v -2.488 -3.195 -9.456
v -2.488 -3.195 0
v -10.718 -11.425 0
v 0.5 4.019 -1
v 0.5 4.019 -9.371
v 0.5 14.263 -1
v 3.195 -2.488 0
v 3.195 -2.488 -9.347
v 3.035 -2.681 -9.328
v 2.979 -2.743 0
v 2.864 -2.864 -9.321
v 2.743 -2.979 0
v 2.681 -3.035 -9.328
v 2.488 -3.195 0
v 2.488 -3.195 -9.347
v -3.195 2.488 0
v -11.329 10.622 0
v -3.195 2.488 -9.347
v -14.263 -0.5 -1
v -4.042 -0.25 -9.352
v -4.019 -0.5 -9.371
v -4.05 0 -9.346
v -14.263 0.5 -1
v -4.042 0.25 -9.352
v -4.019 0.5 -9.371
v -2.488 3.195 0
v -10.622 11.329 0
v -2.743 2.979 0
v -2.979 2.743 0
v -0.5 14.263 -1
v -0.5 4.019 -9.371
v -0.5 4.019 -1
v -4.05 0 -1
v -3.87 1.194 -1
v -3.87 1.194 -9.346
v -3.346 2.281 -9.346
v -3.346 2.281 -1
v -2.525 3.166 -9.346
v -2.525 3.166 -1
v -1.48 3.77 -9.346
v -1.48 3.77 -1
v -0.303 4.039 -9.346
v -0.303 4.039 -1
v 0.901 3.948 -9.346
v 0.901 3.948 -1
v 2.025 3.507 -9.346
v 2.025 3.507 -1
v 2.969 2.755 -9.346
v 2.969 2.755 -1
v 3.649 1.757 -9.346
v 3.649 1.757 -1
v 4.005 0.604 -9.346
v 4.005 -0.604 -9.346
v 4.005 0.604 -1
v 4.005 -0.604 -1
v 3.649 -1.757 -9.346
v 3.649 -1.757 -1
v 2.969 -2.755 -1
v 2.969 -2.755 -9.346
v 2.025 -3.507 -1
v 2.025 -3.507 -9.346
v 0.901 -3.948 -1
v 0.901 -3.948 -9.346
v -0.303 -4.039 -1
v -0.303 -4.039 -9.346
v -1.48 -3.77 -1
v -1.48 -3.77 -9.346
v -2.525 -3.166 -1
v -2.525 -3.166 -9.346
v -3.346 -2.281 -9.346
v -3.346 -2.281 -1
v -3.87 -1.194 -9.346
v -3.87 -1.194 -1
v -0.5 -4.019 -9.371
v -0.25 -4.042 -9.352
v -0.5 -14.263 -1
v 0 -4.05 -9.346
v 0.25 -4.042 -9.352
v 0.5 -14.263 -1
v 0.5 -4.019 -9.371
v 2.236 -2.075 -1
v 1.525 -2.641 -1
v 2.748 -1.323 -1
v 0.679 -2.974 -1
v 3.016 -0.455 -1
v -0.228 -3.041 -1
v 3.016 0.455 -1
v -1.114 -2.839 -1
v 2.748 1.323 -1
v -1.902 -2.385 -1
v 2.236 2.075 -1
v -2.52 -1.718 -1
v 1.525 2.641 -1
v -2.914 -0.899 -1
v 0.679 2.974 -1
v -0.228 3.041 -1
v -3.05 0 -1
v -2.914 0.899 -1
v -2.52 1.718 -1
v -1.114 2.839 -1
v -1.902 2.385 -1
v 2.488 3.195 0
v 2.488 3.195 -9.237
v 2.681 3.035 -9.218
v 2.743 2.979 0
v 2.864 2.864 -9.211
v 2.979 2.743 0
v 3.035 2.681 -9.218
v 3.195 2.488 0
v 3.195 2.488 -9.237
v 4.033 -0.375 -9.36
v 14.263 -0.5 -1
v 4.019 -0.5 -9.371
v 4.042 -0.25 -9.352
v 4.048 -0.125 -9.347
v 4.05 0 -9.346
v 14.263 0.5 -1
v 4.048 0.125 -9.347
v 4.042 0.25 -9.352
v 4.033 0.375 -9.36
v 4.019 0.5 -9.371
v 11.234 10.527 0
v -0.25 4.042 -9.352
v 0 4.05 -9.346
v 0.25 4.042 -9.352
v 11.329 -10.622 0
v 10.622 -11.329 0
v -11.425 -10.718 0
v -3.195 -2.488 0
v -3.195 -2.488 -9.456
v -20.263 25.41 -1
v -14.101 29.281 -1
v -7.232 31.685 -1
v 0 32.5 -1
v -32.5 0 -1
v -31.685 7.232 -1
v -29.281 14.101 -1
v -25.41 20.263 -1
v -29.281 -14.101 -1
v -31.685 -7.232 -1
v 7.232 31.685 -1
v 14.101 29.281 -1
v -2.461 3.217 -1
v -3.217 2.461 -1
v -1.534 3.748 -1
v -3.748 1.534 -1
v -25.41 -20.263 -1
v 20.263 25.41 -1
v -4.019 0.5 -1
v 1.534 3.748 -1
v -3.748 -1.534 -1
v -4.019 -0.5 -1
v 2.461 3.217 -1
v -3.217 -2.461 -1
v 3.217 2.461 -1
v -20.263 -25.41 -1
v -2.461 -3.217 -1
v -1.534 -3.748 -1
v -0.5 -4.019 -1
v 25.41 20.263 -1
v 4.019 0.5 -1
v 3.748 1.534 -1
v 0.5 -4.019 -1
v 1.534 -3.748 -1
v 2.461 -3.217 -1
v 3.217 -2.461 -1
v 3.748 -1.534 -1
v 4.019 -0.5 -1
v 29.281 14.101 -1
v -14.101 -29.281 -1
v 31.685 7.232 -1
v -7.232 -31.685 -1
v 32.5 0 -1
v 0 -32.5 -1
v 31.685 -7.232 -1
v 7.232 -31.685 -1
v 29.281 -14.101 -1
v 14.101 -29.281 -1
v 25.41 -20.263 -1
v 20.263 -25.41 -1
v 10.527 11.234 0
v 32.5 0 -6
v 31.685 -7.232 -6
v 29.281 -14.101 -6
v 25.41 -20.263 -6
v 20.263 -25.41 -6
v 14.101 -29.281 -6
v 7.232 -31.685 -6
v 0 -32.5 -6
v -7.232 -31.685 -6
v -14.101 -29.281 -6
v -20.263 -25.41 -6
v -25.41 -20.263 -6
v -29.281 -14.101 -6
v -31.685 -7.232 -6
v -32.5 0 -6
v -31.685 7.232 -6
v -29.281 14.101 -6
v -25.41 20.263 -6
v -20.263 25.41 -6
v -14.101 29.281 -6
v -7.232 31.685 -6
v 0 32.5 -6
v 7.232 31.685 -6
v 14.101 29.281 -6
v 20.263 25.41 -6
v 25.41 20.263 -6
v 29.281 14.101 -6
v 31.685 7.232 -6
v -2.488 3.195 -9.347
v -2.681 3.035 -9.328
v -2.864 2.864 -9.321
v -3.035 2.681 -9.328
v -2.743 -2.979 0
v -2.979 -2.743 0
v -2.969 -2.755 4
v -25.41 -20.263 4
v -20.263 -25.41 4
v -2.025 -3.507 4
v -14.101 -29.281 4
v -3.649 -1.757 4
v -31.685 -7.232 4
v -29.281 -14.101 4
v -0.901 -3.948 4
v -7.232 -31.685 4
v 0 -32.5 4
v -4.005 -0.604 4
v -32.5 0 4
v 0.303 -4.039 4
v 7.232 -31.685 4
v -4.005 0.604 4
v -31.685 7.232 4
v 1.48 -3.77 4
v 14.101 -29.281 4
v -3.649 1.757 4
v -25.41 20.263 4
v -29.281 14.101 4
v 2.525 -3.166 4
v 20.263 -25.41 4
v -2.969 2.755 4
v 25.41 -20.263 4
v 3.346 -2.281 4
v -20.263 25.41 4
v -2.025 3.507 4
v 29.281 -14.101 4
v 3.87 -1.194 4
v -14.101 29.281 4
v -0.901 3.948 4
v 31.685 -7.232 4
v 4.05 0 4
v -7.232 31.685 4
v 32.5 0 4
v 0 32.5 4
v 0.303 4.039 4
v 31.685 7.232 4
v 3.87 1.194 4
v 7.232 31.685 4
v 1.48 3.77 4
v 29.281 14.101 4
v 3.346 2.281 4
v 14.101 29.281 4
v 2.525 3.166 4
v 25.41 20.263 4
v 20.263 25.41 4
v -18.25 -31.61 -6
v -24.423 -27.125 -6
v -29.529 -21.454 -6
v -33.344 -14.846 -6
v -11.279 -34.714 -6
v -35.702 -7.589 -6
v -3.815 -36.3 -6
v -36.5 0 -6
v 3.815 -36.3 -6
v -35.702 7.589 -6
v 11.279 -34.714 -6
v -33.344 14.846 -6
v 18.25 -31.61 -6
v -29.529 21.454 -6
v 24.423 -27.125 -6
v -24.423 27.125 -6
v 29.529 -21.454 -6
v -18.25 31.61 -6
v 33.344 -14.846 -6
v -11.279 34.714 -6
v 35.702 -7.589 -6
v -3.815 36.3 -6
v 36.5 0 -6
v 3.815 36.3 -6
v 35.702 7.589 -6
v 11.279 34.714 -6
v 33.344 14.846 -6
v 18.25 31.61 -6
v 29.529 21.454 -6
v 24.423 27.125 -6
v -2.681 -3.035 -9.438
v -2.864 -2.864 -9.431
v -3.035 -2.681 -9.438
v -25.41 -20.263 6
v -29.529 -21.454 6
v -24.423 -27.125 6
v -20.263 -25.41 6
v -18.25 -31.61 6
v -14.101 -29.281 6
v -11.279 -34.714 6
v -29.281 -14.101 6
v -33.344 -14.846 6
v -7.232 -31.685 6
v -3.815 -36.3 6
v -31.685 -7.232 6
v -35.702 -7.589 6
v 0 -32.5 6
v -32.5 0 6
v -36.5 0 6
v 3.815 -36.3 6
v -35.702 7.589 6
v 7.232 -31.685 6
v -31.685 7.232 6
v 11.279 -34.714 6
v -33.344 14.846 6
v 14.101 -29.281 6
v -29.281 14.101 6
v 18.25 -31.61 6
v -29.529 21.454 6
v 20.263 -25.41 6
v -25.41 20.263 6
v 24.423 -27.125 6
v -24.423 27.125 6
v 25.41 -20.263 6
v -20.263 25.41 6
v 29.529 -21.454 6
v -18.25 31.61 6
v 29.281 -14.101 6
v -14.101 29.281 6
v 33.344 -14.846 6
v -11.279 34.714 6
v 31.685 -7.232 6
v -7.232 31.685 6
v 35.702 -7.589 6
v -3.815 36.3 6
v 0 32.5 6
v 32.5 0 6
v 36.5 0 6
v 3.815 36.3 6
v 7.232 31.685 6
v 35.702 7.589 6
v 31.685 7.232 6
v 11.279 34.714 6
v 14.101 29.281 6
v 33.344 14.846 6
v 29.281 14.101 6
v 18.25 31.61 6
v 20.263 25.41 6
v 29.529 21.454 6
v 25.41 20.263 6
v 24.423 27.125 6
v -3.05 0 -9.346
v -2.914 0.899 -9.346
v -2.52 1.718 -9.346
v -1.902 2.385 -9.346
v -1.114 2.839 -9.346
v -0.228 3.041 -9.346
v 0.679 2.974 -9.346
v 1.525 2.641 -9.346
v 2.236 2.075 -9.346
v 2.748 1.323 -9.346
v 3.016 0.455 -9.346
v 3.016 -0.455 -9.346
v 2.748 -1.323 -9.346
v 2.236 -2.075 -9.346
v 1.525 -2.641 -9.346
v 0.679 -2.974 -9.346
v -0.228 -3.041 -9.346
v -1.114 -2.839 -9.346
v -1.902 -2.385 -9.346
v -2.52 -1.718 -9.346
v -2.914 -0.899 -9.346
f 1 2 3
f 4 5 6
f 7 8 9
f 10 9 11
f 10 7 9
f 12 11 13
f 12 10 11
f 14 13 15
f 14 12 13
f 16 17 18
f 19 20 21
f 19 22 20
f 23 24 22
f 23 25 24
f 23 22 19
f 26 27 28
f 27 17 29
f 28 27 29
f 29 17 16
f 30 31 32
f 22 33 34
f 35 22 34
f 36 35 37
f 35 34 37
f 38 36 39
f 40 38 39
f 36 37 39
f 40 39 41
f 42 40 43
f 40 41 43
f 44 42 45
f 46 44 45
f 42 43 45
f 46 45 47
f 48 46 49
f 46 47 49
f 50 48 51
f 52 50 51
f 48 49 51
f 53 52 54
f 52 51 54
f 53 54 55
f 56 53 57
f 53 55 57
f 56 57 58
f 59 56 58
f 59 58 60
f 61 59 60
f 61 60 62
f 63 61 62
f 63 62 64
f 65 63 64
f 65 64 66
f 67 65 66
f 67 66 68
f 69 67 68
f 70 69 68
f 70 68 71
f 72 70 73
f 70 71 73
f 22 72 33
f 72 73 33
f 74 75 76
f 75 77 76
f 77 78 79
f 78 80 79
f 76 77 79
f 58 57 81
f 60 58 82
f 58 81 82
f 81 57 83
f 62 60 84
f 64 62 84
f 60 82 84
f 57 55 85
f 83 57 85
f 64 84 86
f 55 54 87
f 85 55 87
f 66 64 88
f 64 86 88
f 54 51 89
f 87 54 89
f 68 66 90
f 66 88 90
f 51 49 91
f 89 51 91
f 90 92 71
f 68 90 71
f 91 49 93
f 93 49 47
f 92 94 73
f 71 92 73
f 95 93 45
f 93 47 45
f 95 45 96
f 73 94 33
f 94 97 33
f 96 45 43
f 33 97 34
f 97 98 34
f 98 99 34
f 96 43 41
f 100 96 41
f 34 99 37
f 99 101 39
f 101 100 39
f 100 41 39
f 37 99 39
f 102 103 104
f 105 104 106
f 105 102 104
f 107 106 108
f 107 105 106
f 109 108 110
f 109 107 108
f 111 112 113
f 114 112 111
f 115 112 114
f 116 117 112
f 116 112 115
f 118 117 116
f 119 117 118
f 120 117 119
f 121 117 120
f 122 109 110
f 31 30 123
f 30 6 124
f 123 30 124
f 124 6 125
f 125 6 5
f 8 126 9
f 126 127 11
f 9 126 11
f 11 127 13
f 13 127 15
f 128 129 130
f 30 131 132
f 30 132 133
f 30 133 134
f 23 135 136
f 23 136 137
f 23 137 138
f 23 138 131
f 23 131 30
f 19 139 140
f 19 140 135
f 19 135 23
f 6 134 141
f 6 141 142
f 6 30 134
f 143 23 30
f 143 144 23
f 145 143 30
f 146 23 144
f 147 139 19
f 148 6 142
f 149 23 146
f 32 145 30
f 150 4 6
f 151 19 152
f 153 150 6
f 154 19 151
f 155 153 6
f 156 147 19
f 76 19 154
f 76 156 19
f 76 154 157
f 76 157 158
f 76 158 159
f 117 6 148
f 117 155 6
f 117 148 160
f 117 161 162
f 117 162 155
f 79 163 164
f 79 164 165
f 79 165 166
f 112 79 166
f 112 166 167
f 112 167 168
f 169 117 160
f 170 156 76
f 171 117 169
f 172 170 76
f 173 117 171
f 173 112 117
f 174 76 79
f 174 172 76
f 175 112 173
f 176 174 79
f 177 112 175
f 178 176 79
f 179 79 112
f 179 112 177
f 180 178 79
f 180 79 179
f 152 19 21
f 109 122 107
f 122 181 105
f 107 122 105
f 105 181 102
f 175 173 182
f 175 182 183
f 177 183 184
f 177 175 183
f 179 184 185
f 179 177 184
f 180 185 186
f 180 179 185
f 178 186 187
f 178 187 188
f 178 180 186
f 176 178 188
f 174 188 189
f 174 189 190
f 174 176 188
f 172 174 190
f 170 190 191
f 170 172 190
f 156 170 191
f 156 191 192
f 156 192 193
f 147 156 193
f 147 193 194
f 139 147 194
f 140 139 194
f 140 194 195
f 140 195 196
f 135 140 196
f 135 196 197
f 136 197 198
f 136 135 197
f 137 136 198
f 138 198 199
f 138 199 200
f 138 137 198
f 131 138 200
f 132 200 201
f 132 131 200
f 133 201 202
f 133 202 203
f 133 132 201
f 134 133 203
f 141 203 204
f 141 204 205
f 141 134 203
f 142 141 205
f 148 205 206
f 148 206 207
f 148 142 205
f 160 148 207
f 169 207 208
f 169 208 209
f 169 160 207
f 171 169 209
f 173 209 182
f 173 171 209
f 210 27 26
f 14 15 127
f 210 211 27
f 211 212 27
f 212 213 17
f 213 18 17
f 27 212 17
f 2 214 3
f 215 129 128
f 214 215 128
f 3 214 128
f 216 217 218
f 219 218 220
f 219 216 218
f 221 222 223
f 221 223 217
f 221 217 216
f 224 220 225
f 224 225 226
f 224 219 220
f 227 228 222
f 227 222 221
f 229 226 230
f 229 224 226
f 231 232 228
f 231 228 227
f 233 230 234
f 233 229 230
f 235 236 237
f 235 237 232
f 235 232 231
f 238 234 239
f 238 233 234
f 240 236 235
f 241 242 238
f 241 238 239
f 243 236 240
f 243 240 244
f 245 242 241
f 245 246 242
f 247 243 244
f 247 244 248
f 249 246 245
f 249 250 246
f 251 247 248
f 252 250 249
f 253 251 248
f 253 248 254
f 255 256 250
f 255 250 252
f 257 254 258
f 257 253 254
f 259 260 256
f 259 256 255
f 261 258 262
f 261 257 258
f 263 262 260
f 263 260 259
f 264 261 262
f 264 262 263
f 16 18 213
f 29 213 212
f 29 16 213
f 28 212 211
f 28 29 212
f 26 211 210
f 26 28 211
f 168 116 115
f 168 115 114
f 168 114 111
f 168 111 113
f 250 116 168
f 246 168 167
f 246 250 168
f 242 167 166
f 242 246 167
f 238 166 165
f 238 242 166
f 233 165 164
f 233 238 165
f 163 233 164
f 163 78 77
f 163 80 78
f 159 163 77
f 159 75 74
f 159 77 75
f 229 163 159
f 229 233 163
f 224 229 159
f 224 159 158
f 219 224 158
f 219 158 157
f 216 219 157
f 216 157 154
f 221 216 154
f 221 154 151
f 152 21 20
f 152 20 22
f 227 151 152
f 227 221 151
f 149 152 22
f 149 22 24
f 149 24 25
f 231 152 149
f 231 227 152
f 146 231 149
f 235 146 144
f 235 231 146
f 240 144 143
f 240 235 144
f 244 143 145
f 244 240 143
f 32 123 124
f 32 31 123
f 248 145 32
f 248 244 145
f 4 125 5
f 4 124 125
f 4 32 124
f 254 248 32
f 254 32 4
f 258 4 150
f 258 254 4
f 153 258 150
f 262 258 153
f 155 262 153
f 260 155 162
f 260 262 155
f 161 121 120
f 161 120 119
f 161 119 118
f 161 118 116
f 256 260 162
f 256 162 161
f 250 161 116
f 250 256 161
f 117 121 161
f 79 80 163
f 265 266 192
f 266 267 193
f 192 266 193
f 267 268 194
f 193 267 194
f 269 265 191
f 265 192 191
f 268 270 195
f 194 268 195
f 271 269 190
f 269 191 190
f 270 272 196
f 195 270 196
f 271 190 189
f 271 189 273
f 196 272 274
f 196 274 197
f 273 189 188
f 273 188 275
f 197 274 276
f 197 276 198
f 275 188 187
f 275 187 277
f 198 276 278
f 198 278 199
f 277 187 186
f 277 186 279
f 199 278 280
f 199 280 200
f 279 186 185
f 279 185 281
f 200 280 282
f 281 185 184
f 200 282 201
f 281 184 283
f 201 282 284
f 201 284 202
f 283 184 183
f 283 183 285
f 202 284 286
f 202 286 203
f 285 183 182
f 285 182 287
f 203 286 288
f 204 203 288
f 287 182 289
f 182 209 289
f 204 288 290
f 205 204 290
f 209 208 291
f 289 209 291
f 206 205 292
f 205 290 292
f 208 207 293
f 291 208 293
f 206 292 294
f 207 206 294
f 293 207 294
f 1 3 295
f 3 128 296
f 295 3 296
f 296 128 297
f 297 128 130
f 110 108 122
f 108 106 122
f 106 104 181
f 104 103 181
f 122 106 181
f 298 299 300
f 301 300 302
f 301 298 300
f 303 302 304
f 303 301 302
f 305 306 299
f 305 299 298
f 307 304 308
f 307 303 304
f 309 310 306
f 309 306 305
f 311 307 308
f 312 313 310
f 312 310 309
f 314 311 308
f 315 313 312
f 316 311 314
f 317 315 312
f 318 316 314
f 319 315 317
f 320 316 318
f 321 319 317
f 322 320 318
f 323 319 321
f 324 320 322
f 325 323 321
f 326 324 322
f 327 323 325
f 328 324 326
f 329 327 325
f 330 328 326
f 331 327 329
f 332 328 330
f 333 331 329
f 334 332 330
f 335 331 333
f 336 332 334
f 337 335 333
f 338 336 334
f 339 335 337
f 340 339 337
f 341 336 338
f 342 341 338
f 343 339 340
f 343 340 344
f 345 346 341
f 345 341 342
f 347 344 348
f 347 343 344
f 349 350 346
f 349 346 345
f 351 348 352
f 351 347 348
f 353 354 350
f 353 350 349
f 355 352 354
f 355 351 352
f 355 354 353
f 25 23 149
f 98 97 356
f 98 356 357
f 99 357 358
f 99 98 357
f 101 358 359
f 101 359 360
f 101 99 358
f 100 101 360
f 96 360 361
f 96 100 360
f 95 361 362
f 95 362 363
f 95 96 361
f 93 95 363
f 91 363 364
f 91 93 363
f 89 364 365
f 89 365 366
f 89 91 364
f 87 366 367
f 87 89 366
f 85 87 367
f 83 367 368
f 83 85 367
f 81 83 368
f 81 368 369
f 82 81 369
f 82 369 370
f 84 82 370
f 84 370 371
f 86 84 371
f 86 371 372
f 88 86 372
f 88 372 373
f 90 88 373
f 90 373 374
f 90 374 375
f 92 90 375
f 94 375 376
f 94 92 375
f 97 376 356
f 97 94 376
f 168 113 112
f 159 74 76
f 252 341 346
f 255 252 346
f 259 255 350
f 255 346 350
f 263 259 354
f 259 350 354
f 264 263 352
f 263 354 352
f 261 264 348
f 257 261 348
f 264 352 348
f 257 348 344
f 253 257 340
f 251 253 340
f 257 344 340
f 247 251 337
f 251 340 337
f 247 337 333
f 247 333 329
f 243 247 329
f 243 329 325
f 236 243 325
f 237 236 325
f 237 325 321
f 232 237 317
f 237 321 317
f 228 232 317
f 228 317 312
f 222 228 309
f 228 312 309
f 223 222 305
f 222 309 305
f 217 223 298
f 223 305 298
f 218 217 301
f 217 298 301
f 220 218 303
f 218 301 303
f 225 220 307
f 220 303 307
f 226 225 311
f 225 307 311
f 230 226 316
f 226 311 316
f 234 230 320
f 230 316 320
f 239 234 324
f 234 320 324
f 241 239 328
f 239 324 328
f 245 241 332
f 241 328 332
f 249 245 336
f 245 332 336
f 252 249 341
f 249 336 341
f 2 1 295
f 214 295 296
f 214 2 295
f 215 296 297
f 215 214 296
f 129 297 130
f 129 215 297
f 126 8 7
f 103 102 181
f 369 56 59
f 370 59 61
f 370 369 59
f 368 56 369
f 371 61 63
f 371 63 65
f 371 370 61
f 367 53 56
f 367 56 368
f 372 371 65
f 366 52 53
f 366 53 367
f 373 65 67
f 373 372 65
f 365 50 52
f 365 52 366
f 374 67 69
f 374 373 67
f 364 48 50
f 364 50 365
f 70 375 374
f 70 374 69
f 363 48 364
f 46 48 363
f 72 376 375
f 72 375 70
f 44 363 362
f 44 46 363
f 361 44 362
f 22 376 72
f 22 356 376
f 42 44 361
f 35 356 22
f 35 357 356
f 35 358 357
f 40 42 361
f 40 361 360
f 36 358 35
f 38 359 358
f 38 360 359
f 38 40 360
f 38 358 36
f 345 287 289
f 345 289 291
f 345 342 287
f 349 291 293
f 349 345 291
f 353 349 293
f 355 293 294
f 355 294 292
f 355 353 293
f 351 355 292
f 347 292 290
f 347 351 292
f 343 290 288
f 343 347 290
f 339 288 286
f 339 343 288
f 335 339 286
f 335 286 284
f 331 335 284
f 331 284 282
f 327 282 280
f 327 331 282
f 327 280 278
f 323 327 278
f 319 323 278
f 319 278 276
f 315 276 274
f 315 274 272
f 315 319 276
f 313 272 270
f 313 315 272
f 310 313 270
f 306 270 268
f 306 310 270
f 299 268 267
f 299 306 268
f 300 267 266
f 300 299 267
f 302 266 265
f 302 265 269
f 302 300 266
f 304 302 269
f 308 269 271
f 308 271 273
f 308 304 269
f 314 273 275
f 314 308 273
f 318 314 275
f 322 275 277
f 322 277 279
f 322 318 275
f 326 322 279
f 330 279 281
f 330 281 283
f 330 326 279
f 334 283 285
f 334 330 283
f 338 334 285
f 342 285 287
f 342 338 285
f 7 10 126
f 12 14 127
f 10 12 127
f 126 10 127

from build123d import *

# Parameters (mm, degrees)
CROQUIS1_R                 = 36.5
SALIENTE_EXTRUIR1_DEPTH    = 6
CROQUIS3_R                 = 32.5
CORTAR_EXTRUIR2_DEPTH      = 2
CORTAR_EXTRUIR3_START      = -5
CROQUIS4_R                 = 32.5
CORTAR_EXTRUIR3_DEPTH      = 5
SALIENTE_EXTRUIR2_DEPTH    = 0.5
SALIENTE_EXTRUIR3_DEPTH    = 0.5
SALIENTE_EXTRUIR7_DEPTH    = 0.5
SALIENTE_EXTRUIR8_DEPTH    = 0.5
CORTAR_EXTRUIR4_DEPTH      = 68
CORTAR_EXTRUIR4_DEPTH_BACK = 62
CROQUIS2_R                 = 4.05
CROQUIS7_R                 = 4.05
CROQUIS7_R_2               = 3.05
SALIENTE_EXTRUIR10_DEPTH   = 8.345621


with BuildPart() as part:
    # Croquis1 → Saliente-Extruir1 (new, symmetric)
    with BuildSketch(Plane.XY):
        Circle(CROQUIS1_R)
    extrude(amount=SALIENTE_EXTRUIR1_DEPTH, both=True)

    # Croquis3 → Cortar-Extruir2 (cut)
    with BuildSketch(Plane.XY.offset(6)):
        Circle(CROQUIS3_R)
    extrude(amount=-CORTAR_EXTRUIR2_DEPTH, mode=Mode.SUBTRACT)

    # Croquis4 → Cortar-Extruir3 (cut)
    with BuildSketch(Plane(origin=(0, 0, -6), x_dir=(-1, 0, 0), z_dir=(0, 0, -1)).offset(CORTAR_EXTRUIR3_START)):
        with Locations(Location((0, 0, 0), (0, 0, 180))):
            Circle(CROQUIS4_R)
    extrude(amount=CORTAR_EXTRUIR3_DEPTH, mode=Mode.SUBTRACT)

    # Croquis5 → Saliente-Extruir2 (add, symmetric)
    with BuildSketch(Plane(origin=(0, 0, 0), x_dir=(0, 0, -1), z_dir=(1, 0, 0))):
        Polygon((12.654998478, 0), (0, -15.487124121), (0, 15.487124121), align=None)
    extrude(amount=SALIENTE_EXTRUIR2_DEPTH, both=True)

    # Croquis6 → Saliente-Extruir3 (add, symmetric)
    with BuildSketch(Plane(origin=(0, 0, 0), x_dir=(1, 0, 0), z_dir=(0, 1, 0))):
        Polygon((0, 12.654998478), (-15.487124121, 0), (15.487124121, 0), align=None)
    extrude(amount=SALIENTE_EXTRUIR3_DEPTH, both=True)


with BuildPart() as body_2:
    # Croquis10 → Saliente-Extruir7 (new, symmetric)
    with BuildSketch(Plane(origin=(0, 0, 4), x_dir=(0, 0, 1), z_dir=(-0.7071067811865488, 0.7071067811865464, 0))):
        Polygon((-4, -15.657340875), (-16.612062838, -0.135231772), (-4, 15.38687733), align=None)
    extrude(amount=SALIENTE_EXTRUIR7_DEPTH, both=True)


with BuildPart() as body_3:
    # Croquis14 → Saliente-Extruir8 (new, symmetric)
    with BuildSketch(Plane(origin=(0, 0, 4), x_dir=(-0.7071067811865486, 0.7071067811865465, 0), z_dir=(-0.7071067811865465, -0.7071067811865486, 0))):
        Polygon((-15.522109102, 4), (0, 16.612062838), (15.522109102, 4), align=None)
    extrude(amount=SALIENTE_EXTRUIR8_DEPTH, both=True)


with BuildPart() as cortar_extruir4_tool:
    # Croquis2 → Cortar-Extruir4 (new, two sides: drawn at the far end of the back side and taken through both)
    with BuildSketch(Plane(origin=(0, 0, -6), x_dir=(-1, 0, 0), z_dir=(0, 0, -1)).offset(-CORTAR_EXTRUIR4_DEPTH_BACK)):
        with Locations(Location((0, 0, 0), (0, 0, 180))):
            Circle(CROQUIS2_R)
    extrude(amount=CORTAR_EXTRUIR4_DEPTH + CORTAR_EXTRUIR4_DEPTH_BACK)


with BuildPart() as part_1:
    add(part.part)

    # Cortar-Extruir4: cut by cortar_extruir4_tool
    add(cortar_extruir4_tool.part, mode=Mode.SUBTRACT)


with BuildPart() as body_2_1:
    add(body_2.part)

    # Cortar-Extruir4: cut by cortar_extruir4_tool
    add(cortar_extruir4_tool.part, mode=Mode.SUBTRACT)


with BuildPart() as body_3_1:
    add(body_3.part)

    # Cortar-Extruir4: cut by cortar_extruir4_tool
    add(cortar_extruir4_tool.part, mode=Mode.SUBTRACT)


with BuildPart() as body_4:
    # Croquis7 → Saliente-Extruir10 (new body)
    with BuildSketch(Plane(origin=(0, 0, -1), x_dir=(-1, 0, 0), z_dir=(0, 0, -1))):
        Circle(CROQUIS7_R)
        Circle(CROQUIS7_R_2, mode=Mode.SUBTRACT)
    extrude(amount=SALIENTE_EXTRUIR10_DEPTH)


solid = Compound([part_1.part, body_2_1.part, body_3_1.part, body_4.part])
